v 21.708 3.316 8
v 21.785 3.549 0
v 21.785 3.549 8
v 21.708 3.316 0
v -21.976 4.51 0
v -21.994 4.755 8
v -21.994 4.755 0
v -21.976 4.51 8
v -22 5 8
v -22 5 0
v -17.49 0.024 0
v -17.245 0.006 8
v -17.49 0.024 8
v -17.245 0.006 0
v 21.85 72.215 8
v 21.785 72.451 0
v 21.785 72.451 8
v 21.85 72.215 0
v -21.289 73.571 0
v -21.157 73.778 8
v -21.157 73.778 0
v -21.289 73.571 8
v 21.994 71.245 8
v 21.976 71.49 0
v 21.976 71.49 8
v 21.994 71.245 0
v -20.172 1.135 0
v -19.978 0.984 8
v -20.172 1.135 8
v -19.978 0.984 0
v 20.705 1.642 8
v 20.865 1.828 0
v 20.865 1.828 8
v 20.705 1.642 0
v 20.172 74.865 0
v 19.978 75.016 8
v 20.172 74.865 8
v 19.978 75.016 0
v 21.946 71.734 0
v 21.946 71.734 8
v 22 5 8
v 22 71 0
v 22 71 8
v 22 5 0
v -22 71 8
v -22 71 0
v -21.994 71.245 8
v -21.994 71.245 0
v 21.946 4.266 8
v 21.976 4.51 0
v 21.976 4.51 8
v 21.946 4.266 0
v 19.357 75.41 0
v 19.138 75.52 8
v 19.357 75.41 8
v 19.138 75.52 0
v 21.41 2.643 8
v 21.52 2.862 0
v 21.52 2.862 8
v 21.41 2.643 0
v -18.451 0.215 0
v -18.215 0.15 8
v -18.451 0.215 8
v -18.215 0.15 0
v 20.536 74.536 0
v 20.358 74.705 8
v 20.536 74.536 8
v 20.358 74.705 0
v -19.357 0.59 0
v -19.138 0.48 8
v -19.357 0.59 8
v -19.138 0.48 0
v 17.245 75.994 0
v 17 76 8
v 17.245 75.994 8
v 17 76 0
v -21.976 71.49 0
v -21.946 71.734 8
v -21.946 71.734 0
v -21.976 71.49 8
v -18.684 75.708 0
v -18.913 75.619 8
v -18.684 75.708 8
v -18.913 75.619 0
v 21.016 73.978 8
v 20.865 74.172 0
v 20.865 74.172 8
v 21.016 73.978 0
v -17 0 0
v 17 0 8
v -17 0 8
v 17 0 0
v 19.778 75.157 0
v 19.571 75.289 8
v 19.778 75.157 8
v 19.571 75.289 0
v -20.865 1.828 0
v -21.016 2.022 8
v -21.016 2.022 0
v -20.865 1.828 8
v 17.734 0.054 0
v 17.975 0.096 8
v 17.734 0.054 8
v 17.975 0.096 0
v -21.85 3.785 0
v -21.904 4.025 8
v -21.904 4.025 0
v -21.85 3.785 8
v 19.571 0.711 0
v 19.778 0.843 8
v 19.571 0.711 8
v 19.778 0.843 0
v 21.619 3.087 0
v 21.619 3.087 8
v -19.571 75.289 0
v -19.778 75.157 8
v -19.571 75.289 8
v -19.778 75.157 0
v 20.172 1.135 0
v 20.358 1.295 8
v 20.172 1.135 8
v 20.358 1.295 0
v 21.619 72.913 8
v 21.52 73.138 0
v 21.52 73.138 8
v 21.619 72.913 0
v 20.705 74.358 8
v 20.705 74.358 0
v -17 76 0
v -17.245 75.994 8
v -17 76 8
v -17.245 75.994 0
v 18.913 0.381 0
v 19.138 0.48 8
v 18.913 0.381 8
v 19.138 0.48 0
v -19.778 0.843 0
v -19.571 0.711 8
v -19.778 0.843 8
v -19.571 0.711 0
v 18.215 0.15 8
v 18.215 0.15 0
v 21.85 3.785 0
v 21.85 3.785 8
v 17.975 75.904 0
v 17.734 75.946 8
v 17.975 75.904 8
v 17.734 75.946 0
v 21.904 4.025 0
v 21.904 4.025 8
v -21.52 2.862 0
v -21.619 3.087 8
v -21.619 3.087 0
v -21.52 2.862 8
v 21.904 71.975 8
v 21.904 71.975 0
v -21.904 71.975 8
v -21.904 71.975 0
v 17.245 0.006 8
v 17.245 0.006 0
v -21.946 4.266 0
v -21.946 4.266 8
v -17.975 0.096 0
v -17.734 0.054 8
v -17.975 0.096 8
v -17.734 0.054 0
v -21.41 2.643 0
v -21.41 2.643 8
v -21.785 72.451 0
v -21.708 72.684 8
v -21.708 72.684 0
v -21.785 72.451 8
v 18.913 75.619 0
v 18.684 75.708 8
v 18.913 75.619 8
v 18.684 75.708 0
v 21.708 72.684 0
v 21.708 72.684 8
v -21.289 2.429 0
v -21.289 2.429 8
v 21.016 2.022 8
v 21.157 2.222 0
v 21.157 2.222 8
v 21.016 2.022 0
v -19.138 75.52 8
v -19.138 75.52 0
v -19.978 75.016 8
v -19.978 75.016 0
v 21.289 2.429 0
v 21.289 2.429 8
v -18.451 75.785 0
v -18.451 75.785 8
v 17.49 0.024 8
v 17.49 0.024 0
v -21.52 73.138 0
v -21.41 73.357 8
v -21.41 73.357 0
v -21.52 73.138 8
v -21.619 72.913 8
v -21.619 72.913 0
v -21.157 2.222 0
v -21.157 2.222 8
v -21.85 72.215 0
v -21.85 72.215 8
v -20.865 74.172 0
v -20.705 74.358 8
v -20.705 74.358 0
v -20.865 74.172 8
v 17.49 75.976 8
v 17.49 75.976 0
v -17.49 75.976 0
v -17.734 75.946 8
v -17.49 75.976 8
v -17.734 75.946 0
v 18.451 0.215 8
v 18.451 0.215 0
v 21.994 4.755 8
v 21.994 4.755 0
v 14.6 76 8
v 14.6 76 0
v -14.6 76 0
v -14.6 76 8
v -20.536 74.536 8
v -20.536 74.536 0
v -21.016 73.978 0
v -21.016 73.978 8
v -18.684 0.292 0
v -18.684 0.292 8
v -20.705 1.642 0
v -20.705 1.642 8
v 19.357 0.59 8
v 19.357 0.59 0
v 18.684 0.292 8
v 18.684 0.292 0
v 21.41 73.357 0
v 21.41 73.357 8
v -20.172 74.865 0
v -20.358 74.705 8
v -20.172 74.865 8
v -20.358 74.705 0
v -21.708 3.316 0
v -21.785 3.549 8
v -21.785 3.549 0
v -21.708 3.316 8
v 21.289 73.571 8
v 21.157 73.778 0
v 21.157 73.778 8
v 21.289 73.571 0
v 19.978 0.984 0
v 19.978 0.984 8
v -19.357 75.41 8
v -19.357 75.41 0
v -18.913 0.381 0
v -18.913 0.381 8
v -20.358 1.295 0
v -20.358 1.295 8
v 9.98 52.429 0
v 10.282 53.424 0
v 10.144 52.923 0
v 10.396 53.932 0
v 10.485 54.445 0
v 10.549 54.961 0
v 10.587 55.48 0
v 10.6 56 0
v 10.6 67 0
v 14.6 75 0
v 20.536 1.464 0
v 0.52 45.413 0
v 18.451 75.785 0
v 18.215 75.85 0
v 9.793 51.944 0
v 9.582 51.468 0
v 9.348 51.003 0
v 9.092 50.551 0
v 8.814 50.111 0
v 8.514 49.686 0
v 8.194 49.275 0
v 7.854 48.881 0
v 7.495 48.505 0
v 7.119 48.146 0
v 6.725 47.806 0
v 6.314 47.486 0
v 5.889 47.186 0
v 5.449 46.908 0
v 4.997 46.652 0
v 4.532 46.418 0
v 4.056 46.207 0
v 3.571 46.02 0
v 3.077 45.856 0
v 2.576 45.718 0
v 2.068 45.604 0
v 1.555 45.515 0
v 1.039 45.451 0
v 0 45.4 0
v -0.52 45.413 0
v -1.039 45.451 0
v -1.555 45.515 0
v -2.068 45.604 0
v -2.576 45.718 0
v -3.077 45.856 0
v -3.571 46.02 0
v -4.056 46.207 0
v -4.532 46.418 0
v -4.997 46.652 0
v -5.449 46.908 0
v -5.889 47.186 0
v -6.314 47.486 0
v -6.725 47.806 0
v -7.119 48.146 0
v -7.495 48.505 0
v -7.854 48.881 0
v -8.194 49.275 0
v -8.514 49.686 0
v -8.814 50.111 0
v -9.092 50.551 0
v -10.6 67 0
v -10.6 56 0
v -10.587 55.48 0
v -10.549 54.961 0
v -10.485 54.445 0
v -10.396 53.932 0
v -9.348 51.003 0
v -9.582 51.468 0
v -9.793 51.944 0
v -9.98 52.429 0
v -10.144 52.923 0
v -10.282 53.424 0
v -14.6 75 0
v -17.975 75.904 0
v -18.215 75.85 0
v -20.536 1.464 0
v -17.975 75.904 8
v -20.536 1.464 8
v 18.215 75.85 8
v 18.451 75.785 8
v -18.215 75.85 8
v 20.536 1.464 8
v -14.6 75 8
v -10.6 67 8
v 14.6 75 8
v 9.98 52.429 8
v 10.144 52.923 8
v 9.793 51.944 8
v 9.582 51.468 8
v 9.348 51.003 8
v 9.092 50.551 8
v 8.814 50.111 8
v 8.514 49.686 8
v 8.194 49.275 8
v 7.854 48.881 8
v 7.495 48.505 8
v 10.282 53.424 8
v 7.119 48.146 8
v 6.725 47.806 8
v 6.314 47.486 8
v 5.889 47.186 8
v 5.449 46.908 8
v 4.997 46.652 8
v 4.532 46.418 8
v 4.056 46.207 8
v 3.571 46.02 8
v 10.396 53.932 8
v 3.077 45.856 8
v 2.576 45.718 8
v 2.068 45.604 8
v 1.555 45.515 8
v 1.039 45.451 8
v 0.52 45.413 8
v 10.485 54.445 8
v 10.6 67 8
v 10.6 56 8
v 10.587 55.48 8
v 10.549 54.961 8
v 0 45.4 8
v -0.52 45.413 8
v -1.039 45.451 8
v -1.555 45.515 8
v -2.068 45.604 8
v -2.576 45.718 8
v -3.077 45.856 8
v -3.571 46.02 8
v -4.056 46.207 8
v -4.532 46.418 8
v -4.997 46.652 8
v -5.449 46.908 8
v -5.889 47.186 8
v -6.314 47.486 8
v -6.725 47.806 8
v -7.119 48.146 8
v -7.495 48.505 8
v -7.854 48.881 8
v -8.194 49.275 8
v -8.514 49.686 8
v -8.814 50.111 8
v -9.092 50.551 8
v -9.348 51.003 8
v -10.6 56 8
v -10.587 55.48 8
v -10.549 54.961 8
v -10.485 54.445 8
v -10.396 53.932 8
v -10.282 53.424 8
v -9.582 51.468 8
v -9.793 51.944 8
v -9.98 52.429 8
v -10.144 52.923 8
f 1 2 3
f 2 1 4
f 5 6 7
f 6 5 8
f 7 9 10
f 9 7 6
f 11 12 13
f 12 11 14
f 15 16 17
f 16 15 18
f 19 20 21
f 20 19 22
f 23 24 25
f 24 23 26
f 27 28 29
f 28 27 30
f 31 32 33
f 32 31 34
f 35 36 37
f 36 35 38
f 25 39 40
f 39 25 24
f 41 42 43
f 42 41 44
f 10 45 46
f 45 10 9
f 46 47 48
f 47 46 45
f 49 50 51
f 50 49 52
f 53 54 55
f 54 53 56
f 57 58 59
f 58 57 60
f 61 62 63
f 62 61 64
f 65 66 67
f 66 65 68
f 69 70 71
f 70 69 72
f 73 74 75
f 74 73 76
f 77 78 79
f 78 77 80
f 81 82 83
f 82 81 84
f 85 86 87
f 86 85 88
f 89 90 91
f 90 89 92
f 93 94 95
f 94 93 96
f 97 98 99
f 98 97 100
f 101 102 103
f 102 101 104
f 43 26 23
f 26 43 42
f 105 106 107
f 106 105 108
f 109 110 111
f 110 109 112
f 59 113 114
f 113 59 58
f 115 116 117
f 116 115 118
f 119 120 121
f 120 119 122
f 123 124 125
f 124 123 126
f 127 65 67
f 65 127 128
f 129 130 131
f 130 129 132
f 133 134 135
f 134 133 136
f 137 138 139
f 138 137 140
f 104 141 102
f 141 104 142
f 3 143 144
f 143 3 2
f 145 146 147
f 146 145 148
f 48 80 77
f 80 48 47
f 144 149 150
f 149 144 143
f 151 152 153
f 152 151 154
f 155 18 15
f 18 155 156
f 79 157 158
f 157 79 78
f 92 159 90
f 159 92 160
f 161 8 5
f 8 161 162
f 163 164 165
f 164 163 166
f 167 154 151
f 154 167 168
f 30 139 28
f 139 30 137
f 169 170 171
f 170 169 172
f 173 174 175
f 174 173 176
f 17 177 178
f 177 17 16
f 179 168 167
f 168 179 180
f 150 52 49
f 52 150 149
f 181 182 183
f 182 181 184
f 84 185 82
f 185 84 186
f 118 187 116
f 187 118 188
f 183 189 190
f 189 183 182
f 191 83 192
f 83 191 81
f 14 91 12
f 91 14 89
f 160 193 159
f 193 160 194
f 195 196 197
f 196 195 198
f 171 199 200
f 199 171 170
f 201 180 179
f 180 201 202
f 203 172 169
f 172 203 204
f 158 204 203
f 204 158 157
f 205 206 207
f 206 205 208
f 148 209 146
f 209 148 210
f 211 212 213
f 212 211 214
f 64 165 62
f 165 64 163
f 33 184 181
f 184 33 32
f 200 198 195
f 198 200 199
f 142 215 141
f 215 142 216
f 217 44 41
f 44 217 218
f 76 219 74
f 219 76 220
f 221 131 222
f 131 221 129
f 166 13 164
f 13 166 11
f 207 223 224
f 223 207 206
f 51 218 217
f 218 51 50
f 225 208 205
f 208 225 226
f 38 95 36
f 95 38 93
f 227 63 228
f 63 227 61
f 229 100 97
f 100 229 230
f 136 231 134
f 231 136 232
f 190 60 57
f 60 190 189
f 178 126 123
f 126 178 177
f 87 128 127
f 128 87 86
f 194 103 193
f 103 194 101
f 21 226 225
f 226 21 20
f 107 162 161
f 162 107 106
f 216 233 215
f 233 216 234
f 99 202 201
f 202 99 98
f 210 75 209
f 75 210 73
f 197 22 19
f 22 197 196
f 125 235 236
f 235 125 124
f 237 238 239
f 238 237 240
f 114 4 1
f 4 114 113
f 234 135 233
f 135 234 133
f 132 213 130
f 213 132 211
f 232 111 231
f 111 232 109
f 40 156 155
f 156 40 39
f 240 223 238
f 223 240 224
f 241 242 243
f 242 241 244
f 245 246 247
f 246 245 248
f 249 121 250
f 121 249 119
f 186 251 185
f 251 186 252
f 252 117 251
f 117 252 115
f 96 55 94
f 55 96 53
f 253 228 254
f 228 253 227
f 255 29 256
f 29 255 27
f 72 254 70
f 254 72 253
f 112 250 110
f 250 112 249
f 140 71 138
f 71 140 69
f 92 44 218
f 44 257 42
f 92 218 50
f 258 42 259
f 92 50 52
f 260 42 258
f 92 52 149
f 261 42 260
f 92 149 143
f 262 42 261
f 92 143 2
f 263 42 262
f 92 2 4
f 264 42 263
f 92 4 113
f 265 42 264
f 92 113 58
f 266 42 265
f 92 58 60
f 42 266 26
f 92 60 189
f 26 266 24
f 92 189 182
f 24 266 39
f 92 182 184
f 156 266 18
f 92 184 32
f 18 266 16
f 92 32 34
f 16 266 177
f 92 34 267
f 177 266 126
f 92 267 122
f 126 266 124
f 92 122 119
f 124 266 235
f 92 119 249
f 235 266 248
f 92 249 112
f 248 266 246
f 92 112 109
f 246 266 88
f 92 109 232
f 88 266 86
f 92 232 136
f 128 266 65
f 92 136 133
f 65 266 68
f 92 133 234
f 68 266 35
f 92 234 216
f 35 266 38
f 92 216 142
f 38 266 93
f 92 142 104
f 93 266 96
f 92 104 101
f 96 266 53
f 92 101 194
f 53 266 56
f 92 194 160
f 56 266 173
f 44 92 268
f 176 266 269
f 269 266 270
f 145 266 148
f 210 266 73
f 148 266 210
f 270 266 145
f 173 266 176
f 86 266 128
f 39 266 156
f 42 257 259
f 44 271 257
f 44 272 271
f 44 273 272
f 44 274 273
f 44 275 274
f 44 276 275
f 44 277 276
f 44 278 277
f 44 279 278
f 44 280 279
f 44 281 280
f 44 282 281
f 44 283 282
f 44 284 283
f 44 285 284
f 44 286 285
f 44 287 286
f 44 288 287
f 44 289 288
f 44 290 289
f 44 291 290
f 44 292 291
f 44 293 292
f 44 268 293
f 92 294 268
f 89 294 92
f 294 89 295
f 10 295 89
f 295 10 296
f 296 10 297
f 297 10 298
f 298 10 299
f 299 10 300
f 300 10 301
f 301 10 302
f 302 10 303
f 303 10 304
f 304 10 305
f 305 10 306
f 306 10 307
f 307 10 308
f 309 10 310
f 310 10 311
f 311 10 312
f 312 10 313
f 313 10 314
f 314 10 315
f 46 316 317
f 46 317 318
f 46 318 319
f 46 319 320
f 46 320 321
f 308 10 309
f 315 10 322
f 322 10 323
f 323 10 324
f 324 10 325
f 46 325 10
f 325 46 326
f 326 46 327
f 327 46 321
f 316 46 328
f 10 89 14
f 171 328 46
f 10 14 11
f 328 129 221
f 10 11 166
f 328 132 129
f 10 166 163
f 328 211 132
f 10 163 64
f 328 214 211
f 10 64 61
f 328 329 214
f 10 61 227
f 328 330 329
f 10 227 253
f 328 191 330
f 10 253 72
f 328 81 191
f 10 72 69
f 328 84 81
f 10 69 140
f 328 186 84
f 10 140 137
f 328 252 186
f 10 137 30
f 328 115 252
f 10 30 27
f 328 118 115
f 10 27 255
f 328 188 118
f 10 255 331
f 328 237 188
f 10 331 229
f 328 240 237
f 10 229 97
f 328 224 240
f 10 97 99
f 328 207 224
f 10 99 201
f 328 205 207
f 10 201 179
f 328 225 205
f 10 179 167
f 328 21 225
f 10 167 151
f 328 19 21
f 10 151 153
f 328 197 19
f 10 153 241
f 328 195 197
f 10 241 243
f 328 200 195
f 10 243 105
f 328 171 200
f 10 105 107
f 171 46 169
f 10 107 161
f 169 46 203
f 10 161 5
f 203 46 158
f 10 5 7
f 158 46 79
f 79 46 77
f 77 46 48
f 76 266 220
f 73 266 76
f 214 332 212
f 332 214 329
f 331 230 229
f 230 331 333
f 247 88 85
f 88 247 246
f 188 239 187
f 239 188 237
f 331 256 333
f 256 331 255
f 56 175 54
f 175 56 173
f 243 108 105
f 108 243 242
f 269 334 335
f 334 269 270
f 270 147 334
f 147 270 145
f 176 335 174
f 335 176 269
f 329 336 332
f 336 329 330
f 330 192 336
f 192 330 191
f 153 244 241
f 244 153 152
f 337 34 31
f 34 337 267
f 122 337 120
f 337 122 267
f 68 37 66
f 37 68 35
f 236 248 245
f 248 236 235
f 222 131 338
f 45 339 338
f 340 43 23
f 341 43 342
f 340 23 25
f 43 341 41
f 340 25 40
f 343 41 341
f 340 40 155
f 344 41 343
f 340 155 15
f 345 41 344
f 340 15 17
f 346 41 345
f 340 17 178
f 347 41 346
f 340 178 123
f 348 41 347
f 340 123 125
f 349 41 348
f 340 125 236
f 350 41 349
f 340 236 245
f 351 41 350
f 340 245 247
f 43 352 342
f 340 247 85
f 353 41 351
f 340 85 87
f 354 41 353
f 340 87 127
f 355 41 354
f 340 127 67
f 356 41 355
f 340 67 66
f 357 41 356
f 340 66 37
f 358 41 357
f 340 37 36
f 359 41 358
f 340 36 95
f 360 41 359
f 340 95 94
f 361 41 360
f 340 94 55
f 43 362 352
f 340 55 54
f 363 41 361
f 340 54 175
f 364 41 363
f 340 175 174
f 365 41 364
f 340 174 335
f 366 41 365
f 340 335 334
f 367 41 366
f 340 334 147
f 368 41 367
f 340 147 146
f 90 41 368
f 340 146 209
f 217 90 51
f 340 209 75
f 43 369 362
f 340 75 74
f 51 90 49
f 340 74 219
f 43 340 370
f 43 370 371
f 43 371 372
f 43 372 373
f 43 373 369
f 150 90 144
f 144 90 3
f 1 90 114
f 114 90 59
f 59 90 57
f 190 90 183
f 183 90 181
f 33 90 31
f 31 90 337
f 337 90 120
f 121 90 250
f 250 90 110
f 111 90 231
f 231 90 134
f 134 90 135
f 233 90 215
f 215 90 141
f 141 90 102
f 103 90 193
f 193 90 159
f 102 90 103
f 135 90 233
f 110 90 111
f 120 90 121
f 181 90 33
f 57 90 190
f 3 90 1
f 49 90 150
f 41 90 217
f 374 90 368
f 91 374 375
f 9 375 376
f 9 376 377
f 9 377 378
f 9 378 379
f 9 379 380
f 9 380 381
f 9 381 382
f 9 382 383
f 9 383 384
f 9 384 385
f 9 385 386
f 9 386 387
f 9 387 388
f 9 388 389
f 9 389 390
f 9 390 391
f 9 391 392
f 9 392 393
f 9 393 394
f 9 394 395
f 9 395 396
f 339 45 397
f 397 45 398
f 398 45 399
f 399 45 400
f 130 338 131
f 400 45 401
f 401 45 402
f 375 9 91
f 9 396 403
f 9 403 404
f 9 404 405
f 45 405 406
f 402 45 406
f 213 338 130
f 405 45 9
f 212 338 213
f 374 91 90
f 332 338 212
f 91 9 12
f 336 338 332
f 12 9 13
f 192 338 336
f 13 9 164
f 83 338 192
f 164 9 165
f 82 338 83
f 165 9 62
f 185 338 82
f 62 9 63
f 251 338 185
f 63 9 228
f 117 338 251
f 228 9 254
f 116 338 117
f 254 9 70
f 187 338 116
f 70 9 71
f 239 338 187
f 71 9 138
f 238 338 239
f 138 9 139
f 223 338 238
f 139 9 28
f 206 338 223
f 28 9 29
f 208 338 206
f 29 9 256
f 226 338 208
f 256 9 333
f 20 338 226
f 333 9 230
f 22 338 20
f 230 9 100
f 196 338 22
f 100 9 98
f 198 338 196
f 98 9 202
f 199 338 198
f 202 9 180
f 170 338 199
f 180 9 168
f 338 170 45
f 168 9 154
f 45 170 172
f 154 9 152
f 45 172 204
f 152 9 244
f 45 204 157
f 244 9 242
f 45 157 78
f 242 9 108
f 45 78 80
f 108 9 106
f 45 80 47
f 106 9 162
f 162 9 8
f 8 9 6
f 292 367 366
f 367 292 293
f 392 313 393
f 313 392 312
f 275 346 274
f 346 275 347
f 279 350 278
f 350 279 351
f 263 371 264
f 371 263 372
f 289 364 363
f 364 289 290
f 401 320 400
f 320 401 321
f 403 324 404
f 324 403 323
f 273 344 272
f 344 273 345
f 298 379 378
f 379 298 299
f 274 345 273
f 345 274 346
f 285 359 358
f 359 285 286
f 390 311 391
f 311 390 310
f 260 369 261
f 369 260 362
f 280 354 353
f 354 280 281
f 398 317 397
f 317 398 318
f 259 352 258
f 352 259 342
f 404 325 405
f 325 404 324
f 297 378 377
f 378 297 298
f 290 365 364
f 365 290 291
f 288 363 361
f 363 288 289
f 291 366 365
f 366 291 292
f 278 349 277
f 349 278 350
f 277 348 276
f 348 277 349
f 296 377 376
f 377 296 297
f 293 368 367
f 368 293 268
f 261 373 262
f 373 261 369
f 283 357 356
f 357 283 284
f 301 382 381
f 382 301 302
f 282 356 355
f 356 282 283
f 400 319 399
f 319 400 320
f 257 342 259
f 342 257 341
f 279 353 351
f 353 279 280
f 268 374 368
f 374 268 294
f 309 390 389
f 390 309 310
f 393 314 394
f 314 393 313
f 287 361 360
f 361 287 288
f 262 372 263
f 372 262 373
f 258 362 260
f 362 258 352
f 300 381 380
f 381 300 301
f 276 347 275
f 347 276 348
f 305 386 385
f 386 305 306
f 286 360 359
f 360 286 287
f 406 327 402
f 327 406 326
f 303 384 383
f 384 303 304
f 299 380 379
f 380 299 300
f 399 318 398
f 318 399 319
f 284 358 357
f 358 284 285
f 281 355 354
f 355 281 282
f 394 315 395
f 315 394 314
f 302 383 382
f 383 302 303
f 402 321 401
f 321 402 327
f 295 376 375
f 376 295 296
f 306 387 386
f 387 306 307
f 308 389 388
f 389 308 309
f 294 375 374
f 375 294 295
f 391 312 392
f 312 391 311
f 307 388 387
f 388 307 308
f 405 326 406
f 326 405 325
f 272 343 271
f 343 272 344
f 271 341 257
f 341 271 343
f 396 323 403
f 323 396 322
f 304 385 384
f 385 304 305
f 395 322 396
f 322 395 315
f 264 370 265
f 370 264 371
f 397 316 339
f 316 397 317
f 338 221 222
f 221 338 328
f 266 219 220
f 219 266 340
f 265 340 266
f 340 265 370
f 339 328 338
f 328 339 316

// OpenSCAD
/*
  Schmale Wandhalter für BAUHAUS / Ezy Storage 18 L
  Aluminium-Rundstange Ø20 mm, identisches Teil 2x drucken.

  Die große flache Rückseite wird an die beiden kurzen Innenwände geklebt.
  Die Boxwand bildet den axialen Anschlag. Die U-Nut bleibt oben offen,
  sodass die Stange mitsamt Rollen nach oben herausgehoben werden kann.

  Empfohlene Einbauposition für typische Rollen bis Ø203,2 mm:
    Stangenmitte 107 mm über dem tiefsten Boxboden.
    Stangenmitte etwa 104 mm von der vorderen Innenwand.
  Die zweite Angabe muss an der realen Box geprüft werden.
*/
$fn = 128;
rod_d = 20.0;
seat_d = 21.2;
plate_t = 8;
plate_w = 44;
plate_h = 76;
seat_z = 56;

module rounded2d(w,h,r) {
  hull() for (x=[-1,1], y=[-1,1])
    translate([x*(w/2-r), y*(h/2-r)]) circle(r=r);
}

module wall_holder_20mm() {
  difference() {
    linear_extrude(height=plate_t)
      translate([0,plate_h/2]) rounded2d(plate_w,plate_h,5);

    translate([0,seat_z,-0.2]) cylinder(d=seat_d,h=plate_t+0.4);
    translate([-seat_d/2,seat_z,-0.2]) cube([seat_d,plate_h-seat_z+1,plate_t+0.4]);
    hull() {
      translate([-seat_d/2,67,-0.2]) cube([seat_d,1,plate_t+0.4]);
      translate([-14.6,75,-0.2]) cube([29.2,1.5,plate_t+0.4]);
    }
  }
}

wall_holder_20mm();
